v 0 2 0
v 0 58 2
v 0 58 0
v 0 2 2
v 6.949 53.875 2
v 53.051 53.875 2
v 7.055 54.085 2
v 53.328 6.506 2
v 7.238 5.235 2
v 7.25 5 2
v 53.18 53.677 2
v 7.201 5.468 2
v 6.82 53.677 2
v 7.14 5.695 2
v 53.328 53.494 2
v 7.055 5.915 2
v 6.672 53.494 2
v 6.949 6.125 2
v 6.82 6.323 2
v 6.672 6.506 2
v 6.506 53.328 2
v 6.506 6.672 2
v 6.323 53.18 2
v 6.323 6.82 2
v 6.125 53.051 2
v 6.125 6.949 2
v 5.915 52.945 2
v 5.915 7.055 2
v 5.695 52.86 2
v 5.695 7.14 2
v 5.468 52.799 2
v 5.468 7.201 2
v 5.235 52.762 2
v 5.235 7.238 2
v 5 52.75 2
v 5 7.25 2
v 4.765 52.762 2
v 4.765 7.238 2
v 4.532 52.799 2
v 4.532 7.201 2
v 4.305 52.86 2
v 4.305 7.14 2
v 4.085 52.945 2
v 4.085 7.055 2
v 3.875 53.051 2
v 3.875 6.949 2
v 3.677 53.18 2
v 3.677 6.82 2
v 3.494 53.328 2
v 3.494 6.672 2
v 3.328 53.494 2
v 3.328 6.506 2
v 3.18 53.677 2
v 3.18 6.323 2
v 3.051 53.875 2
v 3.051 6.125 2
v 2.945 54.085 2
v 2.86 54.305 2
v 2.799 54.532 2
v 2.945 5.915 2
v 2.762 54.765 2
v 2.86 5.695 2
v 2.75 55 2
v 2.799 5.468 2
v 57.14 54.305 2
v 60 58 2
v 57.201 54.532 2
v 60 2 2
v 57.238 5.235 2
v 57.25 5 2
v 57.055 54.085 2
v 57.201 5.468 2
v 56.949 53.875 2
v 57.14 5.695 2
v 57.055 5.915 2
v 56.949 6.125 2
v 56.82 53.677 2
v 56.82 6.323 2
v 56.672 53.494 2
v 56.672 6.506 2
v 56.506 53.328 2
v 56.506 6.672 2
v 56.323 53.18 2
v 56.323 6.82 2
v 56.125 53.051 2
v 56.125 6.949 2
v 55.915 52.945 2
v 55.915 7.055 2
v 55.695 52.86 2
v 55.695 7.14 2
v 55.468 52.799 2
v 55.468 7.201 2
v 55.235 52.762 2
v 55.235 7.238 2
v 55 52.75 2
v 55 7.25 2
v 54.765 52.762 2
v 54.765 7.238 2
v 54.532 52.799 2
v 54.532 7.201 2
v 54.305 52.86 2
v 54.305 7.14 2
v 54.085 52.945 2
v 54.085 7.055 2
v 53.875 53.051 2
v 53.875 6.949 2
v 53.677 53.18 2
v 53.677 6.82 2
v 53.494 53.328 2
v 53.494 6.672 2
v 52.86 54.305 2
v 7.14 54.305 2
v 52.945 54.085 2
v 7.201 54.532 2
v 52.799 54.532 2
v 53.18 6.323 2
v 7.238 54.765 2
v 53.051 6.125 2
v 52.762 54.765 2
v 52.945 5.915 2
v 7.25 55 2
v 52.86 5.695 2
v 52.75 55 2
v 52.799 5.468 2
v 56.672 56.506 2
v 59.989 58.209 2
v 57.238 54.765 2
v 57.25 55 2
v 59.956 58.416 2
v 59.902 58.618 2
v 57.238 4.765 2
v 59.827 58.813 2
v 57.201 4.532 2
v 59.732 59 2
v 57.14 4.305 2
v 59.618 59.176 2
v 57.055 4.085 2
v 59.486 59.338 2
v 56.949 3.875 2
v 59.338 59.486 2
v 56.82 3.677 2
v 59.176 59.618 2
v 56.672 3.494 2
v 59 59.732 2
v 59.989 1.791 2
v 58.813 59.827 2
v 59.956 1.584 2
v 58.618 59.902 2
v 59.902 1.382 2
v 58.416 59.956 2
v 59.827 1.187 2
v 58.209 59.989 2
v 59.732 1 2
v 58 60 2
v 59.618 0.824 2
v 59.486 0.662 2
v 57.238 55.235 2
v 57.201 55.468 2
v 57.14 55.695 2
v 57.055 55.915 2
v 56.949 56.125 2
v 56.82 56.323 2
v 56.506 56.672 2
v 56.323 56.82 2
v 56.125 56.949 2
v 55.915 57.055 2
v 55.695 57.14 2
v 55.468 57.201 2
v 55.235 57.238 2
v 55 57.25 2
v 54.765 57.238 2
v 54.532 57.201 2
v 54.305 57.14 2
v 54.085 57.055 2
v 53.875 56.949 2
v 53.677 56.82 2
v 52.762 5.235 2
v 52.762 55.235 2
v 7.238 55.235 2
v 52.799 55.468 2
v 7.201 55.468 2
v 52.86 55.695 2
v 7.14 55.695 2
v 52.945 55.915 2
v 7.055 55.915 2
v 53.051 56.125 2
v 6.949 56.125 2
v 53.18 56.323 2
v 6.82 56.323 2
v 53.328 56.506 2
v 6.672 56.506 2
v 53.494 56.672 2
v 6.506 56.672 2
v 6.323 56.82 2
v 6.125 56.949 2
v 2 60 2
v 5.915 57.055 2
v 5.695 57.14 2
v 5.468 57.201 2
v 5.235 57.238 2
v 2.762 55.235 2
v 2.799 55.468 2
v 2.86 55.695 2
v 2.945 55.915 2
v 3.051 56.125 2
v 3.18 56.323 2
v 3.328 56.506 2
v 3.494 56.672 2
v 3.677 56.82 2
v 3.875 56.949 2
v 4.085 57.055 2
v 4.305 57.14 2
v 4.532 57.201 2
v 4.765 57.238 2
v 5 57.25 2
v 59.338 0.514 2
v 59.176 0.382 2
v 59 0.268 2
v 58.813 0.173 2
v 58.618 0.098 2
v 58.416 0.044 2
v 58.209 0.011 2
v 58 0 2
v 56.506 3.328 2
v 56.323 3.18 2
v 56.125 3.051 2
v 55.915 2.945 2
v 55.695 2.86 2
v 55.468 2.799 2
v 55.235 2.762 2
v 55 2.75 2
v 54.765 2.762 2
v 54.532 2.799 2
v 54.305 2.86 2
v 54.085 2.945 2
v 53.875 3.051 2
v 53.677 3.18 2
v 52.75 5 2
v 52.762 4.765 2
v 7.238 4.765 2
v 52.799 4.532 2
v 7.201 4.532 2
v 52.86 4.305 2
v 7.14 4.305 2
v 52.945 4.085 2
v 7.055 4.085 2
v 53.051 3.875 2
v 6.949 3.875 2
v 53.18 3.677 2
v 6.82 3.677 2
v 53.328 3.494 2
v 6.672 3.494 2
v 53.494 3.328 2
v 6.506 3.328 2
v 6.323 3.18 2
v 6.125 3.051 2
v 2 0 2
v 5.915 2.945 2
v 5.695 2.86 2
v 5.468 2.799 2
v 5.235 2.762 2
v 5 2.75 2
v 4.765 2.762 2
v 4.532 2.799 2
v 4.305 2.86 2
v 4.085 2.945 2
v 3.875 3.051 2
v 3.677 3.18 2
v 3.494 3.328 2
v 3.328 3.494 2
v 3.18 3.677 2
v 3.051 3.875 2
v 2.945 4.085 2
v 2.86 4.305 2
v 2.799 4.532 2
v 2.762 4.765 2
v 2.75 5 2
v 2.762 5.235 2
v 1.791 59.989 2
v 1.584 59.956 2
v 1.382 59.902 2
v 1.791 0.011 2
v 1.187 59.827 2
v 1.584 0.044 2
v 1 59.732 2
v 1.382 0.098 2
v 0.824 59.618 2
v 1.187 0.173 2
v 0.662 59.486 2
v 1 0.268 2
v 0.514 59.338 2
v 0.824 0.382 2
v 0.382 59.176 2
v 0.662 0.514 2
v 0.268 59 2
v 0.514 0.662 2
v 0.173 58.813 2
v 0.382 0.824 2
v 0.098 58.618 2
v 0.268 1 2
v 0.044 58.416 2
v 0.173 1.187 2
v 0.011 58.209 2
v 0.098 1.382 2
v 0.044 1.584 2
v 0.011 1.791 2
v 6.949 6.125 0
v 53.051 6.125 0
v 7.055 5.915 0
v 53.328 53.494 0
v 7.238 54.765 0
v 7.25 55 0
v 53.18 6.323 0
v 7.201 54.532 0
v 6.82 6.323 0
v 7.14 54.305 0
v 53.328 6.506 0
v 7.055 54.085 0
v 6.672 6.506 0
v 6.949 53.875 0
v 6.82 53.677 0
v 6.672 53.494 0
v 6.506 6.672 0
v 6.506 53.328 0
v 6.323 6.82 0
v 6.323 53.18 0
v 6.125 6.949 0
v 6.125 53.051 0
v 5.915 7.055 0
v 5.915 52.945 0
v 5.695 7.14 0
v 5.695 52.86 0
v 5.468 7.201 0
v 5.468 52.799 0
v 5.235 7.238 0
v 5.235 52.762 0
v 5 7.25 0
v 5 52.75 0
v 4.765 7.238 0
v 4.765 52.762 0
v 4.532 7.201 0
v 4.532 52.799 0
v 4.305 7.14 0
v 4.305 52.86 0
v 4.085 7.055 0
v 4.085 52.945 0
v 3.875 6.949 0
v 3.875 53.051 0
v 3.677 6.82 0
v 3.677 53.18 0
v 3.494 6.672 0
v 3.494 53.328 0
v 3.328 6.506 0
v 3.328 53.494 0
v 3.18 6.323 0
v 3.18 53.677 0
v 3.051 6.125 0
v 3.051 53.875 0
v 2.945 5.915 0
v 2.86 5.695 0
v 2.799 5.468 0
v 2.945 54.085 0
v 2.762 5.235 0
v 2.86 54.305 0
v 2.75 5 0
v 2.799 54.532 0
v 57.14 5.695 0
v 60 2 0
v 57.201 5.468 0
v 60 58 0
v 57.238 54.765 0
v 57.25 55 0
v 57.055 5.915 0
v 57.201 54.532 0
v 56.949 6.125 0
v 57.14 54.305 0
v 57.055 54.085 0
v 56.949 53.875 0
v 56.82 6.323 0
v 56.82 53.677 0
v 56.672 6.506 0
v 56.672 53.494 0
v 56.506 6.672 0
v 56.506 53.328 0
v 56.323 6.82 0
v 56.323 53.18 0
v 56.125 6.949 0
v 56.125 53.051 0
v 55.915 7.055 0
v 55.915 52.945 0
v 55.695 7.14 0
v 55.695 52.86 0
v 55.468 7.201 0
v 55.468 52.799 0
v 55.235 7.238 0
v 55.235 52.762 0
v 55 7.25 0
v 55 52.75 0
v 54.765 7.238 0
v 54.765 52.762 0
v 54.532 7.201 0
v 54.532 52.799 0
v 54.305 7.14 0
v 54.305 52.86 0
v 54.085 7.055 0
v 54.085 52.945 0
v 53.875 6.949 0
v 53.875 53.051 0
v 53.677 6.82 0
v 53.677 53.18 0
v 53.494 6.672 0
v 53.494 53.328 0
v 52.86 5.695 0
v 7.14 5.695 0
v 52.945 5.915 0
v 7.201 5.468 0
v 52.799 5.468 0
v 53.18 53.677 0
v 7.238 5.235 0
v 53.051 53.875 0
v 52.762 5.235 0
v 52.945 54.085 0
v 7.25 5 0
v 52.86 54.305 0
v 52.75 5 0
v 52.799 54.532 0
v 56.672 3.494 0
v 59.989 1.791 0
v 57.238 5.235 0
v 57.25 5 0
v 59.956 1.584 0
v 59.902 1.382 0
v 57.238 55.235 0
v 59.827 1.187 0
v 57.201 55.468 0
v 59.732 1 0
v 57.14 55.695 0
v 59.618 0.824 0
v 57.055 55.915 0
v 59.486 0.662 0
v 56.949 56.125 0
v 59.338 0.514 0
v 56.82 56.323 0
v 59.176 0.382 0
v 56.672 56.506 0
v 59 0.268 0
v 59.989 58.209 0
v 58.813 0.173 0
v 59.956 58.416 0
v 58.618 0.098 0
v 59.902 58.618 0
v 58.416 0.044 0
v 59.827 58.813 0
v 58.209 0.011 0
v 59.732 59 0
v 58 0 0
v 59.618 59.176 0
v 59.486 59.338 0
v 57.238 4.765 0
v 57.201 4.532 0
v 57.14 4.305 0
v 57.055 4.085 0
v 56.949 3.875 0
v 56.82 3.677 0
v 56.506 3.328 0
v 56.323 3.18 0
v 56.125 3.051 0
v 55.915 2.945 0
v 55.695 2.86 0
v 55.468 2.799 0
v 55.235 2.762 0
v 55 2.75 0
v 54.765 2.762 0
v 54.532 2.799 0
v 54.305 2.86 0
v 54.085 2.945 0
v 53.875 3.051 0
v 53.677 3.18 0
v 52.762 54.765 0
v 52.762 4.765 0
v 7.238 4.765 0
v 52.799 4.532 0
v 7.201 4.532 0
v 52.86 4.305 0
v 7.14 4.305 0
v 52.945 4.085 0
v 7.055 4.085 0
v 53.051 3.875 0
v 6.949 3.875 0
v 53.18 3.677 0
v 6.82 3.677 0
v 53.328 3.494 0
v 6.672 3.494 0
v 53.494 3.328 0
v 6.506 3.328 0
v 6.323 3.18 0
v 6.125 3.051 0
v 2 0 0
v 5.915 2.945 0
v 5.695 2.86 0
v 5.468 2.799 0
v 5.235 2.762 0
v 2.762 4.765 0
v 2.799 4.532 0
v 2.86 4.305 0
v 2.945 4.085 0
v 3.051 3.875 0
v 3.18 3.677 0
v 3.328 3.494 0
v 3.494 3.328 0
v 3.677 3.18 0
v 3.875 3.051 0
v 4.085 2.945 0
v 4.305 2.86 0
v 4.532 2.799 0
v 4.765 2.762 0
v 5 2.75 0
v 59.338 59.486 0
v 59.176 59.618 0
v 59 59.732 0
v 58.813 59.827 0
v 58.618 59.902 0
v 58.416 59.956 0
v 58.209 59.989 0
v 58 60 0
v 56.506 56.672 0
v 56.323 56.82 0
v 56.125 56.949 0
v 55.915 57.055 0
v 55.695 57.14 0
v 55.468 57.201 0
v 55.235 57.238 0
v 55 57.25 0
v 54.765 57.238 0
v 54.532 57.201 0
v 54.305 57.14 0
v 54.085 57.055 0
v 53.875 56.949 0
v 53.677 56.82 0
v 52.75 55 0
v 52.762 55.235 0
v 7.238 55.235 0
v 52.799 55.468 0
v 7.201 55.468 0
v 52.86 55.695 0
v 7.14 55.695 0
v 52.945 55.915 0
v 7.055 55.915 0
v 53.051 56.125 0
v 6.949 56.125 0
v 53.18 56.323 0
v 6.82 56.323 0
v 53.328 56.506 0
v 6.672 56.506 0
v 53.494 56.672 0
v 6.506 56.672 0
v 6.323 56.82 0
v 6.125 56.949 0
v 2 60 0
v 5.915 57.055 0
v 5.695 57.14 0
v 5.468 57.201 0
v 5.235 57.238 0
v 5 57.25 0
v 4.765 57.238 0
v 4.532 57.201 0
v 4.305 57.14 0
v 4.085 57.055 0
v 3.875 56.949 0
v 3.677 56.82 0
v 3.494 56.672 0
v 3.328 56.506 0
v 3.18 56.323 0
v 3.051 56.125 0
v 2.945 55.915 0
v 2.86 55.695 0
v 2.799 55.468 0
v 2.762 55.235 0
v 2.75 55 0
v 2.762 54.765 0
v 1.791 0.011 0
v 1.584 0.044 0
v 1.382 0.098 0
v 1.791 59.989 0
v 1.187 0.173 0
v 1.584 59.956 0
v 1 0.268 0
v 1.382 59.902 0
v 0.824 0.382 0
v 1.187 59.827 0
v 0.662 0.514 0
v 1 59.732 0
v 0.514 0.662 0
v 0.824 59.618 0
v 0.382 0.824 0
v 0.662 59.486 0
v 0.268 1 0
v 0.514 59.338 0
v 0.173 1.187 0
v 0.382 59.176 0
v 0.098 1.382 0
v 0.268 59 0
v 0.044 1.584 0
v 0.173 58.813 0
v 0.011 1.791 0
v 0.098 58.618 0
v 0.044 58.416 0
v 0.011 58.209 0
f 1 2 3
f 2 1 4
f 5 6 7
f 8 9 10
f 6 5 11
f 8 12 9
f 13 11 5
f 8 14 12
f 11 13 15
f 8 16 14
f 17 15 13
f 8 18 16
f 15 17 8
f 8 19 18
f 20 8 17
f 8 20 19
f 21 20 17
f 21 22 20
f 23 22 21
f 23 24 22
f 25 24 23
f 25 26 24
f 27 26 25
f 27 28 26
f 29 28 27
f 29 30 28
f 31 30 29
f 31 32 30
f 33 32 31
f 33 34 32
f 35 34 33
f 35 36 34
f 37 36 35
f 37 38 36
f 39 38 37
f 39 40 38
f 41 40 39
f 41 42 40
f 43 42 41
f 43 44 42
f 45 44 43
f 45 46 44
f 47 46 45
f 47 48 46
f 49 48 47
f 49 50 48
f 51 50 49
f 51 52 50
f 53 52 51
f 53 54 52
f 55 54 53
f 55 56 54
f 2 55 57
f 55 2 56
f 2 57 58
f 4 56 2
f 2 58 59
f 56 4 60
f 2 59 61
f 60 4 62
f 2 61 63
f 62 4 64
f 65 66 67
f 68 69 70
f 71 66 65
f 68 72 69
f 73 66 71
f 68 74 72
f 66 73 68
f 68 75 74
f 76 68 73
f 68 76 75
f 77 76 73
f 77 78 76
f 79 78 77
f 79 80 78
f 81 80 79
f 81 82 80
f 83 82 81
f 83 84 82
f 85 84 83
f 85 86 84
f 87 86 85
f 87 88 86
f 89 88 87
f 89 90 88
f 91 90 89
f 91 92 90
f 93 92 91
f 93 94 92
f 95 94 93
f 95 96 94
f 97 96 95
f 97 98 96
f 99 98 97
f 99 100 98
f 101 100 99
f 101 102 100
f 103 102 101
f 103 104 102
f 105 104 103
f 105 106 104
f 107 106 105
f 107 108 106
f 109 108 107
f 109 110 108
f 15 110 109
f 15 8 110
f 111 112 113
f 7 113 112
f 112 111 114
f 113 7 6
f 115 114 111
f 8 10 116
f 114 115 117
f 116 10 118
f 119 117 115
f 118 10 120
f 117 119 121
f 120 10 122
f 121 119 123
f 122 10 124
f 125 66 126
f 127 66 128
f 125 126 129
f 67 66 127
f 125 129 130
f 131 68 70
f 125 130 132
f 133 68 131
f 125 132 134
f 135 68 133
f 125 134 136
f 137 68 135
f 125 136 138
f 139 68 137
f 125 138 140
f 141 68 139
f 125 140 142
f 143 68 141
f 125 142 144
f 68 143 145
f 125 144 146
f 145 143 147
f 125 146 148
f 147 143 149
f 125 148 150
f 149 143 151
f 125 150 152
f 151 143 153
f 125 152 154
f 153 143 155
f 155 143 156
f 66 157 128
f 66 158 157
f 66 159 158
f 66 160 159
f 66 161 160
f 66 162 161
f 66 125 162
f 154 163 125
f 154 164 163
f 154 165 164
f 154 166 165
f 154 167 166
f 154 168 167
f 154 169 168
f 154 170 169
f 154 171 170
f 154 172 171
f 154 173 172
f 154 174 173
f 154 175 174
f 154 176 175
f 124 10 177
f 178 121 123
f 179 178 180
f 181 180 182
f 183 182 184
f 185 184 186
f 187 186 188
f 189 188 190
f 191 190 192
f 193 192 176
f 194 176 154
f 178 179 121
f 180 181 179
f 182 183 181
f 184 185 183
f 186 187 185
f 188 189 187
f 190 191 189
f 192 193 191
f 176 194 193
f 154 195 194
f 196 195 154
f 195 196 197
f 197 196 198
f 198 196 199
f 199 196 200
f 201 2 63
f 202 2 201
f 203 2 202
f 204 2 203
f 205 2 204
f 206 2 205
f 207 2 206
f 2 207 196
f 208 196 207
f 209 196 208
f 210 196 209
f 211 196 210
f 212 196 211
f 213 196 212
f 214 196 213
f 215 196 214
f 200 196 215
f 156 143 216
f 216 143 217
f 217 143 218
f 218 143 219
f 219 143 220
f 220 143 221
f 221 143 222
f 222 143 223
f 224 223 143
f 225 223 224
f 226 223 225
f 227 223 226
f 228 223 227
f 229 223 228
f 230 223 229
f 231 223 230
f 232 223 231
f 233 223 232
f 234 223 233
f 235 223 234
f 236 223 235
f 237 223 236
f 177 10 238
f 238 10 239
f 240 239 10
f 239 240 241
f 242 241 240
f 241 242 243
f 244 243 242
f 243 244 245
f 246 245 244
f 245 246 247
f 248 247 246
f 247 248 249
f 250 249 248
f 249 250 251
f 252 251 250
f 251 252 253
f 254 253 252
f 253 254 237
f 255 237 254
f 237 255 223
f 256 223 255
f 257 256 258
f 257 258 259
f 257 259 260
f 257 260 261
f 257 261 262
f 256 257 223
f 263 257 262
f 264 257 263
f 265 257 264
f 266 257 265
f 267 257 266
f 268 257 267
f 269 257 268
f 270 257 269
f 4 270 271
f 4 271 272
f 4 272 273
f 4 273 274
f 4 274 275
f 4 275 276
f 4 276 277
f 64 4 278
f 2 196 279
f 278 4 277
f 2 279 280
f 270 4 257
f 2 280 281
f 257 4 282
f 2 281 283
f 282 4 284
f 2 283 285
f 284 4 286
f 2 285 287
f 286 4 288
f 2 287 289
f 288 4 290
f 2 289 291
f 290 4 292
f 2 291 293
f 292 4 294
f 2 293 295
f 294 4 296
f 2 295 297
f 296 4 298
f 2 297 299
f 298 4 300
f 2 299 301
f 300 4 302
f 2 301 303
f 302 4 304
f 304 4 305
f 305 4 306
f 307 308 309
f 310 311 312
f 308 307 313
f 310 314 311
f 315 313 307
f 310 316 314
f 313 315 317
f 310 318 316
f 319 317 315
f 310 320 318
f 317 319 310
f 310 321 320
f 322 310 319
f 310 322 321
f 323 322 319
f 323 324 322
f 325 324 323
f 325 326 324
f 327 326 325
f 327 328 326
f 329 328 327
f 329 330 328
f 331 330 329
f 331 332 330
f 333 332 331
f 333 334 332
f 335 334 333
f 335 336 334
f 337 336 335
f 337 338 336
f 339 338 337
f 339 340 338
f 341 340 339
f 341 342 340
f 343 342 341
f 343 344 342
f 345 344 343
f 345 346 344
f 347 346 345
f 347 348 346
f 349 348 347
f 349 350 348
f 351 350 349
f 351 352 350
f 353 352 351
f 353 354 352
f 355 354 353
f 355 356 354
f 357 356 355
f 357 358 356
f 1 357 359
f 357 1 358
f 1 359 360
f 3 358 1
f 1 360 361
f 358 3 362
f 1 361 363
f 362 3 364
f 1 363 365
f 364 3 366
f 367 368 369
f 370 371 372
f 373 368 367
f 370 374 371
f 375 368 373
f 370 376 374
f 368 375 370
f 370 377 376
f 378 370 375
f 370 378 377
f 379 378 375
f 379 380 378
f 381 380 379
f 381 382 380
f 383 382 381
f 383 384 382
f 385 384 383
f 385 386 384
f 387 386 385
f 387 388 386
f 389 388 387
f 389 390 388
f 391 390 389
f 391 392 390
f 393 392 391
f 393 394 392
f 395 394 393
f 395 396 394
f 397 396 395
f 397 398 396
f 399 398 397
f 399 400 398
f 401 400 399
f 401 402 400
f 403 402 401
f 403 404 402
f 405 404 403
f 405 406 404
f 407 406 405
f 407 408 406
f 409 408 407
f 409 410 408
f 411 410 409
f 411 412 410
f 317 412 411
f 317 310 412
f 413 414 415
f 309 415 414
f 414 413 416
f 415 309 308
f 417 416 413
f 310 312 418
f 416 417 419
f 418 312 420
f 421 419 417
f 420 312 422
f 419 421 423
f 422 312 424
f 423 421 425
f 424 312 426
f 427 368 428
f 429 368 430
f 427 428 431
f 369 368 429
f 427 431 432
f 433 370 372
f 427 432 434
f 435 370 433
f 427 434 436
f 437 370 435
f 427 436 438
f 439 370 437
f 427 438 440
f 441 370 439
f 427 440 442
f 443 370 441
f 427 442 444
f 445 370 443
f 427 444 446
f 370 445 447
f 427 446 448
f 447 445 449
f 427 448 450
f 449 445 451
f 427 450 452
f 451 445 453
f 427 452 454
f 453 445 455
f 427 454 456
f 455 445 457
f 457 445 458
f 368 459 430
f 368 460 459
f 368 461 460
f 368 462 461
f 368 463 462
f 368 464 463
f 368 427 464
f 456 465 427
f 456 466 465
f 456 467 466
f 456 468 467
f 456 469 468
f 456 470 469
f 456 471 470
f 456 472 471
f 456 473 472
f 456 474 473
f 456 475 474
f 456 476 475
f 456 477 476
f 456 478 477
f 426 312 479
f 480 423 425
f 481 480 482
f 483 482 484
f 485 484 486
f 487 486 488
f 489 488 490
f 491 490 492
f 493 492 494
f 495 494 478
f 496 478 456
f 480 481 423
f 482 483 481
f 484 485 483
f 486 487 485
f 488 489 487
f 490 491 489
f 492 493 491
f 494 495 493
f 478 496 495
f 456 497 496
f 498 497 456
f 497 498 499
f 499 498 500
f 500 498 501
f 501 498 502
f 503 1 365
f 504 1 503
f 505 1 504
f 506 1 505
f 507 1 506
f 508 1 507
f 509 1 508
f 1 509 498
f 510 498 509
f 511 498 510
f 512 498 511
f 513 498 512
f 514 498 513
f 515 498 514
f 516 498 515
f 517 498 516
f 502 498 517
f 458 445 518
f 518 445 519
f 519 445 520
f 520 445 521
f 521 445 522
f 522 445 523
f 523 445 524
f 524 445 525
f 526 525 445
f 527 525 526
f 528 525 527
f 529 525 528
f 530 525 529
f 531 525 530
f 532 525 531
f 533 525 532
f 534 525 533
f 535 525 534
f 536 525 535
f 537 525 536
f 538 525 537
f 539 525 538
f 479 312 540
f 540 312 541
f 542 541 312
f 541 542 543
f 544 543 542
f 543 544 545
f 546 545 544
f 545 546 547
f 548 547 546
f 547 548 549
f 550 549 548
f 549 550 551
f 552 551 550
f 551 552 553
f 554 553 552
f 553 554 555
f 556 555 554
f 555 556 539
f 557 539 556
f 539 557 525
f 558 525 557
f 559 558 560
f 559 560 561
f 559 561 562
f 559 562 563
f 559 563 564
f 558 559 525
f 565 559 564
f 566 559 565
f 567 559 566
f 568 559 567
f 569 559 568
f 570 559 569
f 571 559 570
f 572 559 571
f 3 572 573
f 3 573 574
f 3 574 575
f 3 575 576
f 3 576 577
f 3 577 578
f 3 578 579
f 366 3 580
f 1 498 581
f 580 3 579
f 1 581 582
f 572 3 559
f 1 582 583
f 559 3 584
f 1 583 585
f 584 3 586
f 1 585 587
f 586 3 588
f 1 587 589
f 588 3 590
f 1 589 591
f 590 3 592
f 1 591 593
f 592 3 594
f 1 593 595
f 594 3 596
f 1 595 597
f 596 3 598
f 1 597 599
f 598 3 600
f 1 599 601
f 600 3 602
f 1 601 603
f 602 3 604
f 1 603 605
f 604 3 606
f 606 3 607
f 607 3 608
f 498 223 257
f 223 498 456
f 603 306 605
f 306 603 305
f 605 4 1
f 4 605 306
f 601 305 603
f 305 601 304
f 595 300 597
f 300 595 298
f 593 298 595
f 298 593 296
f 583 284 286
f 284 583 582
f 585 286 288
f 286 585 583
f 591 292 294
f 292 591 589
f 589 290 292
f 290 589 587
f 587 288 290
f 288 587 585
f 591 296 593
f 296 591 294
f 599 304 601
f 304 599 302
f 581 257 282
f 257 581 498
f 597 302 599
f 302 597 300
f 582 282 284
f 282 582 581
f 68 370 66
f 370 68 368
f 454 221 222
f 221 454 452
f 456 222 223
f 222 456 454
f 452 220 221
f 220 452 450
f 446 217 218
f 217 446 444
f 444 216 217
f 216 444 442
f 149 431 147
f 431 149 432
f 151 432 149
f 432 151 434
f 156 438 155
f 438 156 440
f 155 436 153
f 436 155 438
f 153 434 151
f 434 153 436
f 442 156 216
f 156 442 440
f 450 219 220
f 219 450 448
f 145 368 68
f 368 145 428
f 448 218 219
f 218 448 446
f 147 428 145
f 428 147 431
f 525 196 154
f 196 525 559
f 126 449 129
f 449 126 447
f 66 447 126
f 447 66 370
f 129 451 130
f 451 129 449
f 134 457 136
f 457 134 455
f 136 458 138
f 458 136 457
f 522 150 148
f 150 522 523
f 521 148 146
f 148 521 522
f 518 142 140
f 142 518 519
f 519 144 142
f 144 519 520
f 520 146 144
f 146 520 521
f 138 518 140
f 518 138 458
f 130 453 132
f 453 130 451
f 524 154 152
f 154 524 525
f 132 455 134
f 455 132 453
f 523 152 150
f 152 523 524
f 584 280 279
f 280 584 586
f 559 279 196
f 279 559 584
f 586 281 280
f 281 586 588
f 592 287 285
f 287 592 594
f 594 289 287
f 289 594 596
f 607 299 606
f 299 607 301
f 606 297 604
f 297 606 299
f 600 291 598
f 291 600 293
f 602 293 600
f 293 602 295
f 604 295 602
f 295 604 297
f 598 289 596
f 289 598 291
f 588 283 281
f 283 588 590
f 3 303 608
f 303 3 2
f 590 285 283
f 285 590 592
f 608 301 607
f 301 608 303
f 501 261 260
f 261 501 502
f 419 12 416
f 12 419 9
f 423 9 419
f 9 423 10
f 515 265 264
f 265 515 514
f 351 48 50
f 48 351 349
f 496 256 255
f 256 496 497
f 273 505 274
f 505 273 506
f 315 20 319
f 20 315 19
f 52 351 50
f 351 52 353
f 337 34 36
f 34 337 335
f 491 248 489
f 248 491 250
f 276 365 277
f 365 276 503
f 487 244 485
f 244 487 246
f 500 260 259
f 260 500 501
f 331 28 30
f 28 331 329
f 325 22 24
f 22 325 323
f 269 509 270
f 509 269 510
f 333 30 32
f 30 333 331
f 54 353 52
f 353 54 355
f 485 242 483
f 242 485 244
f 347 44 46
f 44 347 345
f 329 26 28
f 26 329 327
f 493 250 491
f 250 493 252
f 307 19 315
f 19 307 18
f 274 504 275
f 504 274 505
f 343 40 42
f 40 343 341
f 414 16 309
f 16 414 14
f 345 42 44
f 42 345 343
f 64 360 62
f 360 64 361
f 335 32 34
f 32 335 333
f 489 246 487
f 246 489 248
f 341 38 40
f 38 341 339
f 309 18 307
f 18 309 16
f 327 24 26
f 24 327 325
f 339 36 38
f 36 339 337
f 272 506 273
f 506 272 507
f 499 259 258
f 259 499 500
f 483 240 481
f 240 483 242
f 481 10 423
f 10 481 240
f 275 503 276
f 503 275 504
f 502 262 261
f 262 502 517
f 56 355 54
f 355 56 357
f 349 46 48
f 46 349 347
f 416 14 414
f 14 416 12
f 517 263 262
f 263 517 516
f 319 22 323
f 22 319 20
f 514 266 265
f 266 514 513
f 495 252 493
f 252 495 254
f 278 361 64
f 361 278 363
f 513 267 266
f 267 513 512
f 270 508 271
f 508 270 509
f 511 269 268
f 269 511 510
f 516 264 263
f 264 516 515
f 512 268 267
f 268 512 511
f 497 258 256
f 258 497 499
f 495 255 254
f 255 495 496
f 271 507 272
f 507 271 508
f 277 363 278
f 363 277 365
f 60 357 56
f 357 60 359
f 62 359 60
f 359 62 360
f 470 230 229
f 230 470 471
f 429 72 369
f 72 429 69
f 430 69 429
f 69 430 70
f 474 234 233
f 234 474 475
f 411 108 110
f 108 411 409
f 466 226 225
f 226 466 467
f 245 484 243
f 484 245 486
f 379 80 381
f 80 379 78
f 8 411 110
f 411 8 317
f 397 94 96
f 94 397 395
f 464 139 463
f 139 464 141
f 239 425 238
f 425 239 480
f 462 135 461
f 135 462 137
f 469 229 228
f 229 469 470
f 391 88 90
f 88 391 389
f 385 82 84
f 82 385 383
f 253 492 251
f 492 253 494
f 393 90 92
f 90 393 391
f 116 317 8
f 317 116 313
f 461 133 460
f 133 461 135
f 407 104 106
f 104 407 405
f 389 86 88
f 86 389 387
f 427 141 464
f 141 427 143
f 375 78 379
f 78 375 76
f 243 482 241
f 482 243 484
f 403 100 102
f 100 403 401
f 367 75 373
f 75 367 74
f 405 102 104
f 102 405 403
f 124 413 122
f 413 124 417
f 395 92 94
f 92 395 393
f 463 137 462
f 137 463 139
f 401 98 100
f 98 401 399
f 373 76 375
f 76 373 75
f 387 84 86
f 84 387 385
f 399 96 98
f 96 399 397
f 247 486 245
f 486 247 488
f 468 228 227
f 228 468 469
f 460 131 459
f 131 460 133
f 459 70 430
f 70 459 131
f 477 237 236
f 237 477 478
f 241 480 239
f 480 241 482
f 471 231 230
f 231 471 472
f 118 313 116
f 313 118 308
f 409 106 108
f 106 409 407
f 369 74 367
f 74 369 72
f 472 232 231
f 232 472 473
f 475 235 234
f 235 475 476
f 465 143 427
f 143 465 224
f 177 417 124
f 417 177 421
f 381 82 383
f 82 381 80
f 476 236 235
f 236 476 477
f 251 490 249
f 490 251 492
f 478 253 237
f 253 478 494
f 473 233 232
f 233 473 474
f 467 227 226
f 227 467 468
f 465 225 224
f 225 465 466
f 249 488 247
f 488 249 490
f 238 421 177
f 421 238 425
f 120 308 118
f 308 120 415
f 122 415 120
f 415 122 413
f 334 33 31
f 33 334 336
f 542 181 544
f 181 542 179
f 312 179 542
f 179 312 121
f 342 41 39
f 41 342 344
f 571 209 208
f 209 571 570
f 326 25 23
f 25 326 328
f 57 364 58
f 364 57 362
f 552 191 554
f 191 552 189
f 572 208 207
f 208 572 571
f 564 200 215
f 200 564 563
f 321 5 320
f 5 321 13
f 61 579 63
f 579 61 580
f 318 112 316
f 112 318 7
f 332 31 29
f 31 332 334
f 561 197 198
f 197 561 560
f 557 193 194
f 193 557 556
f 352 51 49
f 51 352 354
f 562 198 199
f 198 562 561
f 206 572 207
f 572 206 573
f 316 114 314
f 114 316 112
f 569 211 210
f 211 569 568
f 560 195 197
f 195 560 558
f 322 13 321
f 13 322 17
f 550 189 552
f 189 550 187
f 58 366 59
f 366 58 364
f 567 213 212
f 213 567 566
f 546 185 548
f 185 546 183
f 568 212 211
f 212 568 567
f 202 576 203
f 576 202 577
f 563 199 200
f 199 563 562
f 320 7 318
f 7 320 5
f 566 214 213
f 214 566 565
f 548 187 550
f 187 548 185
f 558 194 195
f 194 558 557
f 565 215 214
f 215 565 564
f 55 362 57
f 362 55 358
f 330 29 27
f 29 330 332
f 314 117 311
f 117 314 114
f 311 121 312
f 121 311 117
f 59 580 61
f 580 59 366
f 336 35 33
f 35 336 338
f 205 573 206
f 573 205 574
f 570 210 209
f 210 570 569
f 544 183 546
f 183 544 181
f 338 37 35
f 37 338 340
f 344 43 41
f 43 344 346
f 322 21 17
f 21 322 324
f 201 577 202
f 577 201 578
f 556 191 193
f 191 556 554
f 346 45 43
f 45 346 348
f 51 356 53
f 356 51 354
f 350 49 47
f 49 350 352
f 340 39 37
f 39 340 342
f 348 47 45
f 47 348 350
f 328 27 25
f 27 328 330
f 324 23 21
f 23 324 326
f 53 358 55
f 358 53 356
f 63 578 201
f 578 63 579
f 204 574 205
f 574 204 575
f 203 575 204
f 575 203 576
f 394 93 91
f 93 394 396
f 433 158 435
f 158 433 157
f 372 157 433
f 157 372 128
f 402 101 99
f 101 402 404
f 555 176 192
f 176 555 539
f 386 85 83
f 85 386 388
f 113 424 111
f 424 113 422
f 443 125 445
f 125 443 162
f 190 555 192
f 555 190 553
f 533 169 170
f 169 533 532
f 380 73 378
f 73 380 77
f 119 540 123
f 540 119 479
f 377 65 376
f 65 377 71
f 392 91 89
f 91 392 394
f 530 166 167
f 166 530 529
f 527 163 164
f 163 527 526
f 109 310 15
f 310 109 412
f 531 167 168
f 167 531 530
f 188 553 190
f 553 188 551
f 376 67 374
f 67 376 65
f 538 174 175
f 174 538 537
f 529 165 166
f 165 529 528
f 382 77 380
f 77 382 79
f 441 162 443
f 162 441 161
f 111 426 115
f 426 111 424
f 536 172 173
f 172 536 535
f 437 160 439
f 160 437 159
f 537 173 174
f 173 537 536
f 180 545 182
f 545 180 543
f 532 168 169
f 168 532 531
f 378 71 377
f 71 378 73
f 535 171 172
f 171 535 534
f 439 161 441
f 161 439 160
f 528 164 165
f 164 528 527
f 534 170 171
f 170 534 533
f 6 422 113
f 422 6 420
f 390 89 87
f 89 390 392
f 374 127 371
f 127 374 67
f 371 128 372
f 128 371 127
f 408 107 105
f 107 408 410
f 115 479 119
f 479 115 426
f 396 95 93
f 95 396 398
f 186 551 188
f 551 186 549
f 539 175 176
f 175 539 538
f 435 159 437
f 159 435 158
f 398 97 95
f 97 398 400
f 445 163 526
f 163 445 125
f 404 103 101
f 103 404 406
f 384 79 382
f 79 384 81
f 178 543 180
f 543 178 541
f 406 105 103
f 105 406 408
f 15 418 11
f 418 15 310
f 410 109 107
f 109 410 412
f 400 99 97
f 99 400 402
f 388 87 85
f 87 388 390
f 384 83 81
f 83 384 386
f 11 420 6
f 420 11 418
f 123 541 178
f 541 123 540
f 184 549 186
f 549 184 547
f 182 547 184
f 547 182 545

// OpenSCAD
// file: ../shapes/curved-corner.scad
module CurvedCorner(radius, thickness) {
    difference() {
        cylinder(h = thickness, r = radius);
        translate([ -radius * 2, -radius, -0.1 ]) { cube(radius * 2); }
        translate([ -0.1, -radius * 2, -0.1 ]) { cube(radius * 2); }
    }
}

module CurvedInsideCorner(radius, thickness) {

    translate([ radius, radius, 0 ]) {
        rotate([ 0, 0, 180 ]) {
            difference() {
                cube([ radius, radius, thickness ]);
                translate([ 0, 0, -0.1 ]) {
                    cylinder(h = thickness + 0.2, r = radius);
                }
            }
        }
    }
}
// main file
use <../shapes/curved-corner.scad>

$fn = 60;

x = 60;
y = 60;
t = 2;

corner_radius = 2;

hole_diam = 4.5;
hole_offset=2.5;

module lid(x, y, t, corner_radius, hole_diam, hole_offset) {

    difference() {
        cube([ x, y, t ]);
        CurvedInsideCorner(corner_radius, t);
        translate([ x, 0, 0 ]) {
            rotate([ 0, 0, 90 ]) { CurvedInsideCorner(corner_radius, t); }
        }
        translate([ x, y, 0 ]) {
            rotate([ 0, 0, 180 ]) { CurvedInsideCorner(corner_radius, t); }
        }
        translate([ 0, y, 0 ]) {
            rotate([ 0, 0, 270 ]) { CurvedInsideCorner(corner_radius, t); }
        }
        translate([hole_offset*2, hole_offset*2, 0]){
            cylinder(h=t, r=hole_diam/2);
        }
        translate([x-hole_offset*2, hole_offset*2, 0]){
            cylinder(h=t, r=hole_diam/2);
        }
        translate([hole_offset*2, y-hole_offset*2, 0]){
            cylinder(h=t, r=hole_diam/2);
        }
        translate([x-hole_offset*2, y-hole_offset*2, 0]){
            cylinder(h=t, r=hole_diam/2);
        }
    }
}

lid(x, y, t, corner_radius, hole_diam, hole_offset);
